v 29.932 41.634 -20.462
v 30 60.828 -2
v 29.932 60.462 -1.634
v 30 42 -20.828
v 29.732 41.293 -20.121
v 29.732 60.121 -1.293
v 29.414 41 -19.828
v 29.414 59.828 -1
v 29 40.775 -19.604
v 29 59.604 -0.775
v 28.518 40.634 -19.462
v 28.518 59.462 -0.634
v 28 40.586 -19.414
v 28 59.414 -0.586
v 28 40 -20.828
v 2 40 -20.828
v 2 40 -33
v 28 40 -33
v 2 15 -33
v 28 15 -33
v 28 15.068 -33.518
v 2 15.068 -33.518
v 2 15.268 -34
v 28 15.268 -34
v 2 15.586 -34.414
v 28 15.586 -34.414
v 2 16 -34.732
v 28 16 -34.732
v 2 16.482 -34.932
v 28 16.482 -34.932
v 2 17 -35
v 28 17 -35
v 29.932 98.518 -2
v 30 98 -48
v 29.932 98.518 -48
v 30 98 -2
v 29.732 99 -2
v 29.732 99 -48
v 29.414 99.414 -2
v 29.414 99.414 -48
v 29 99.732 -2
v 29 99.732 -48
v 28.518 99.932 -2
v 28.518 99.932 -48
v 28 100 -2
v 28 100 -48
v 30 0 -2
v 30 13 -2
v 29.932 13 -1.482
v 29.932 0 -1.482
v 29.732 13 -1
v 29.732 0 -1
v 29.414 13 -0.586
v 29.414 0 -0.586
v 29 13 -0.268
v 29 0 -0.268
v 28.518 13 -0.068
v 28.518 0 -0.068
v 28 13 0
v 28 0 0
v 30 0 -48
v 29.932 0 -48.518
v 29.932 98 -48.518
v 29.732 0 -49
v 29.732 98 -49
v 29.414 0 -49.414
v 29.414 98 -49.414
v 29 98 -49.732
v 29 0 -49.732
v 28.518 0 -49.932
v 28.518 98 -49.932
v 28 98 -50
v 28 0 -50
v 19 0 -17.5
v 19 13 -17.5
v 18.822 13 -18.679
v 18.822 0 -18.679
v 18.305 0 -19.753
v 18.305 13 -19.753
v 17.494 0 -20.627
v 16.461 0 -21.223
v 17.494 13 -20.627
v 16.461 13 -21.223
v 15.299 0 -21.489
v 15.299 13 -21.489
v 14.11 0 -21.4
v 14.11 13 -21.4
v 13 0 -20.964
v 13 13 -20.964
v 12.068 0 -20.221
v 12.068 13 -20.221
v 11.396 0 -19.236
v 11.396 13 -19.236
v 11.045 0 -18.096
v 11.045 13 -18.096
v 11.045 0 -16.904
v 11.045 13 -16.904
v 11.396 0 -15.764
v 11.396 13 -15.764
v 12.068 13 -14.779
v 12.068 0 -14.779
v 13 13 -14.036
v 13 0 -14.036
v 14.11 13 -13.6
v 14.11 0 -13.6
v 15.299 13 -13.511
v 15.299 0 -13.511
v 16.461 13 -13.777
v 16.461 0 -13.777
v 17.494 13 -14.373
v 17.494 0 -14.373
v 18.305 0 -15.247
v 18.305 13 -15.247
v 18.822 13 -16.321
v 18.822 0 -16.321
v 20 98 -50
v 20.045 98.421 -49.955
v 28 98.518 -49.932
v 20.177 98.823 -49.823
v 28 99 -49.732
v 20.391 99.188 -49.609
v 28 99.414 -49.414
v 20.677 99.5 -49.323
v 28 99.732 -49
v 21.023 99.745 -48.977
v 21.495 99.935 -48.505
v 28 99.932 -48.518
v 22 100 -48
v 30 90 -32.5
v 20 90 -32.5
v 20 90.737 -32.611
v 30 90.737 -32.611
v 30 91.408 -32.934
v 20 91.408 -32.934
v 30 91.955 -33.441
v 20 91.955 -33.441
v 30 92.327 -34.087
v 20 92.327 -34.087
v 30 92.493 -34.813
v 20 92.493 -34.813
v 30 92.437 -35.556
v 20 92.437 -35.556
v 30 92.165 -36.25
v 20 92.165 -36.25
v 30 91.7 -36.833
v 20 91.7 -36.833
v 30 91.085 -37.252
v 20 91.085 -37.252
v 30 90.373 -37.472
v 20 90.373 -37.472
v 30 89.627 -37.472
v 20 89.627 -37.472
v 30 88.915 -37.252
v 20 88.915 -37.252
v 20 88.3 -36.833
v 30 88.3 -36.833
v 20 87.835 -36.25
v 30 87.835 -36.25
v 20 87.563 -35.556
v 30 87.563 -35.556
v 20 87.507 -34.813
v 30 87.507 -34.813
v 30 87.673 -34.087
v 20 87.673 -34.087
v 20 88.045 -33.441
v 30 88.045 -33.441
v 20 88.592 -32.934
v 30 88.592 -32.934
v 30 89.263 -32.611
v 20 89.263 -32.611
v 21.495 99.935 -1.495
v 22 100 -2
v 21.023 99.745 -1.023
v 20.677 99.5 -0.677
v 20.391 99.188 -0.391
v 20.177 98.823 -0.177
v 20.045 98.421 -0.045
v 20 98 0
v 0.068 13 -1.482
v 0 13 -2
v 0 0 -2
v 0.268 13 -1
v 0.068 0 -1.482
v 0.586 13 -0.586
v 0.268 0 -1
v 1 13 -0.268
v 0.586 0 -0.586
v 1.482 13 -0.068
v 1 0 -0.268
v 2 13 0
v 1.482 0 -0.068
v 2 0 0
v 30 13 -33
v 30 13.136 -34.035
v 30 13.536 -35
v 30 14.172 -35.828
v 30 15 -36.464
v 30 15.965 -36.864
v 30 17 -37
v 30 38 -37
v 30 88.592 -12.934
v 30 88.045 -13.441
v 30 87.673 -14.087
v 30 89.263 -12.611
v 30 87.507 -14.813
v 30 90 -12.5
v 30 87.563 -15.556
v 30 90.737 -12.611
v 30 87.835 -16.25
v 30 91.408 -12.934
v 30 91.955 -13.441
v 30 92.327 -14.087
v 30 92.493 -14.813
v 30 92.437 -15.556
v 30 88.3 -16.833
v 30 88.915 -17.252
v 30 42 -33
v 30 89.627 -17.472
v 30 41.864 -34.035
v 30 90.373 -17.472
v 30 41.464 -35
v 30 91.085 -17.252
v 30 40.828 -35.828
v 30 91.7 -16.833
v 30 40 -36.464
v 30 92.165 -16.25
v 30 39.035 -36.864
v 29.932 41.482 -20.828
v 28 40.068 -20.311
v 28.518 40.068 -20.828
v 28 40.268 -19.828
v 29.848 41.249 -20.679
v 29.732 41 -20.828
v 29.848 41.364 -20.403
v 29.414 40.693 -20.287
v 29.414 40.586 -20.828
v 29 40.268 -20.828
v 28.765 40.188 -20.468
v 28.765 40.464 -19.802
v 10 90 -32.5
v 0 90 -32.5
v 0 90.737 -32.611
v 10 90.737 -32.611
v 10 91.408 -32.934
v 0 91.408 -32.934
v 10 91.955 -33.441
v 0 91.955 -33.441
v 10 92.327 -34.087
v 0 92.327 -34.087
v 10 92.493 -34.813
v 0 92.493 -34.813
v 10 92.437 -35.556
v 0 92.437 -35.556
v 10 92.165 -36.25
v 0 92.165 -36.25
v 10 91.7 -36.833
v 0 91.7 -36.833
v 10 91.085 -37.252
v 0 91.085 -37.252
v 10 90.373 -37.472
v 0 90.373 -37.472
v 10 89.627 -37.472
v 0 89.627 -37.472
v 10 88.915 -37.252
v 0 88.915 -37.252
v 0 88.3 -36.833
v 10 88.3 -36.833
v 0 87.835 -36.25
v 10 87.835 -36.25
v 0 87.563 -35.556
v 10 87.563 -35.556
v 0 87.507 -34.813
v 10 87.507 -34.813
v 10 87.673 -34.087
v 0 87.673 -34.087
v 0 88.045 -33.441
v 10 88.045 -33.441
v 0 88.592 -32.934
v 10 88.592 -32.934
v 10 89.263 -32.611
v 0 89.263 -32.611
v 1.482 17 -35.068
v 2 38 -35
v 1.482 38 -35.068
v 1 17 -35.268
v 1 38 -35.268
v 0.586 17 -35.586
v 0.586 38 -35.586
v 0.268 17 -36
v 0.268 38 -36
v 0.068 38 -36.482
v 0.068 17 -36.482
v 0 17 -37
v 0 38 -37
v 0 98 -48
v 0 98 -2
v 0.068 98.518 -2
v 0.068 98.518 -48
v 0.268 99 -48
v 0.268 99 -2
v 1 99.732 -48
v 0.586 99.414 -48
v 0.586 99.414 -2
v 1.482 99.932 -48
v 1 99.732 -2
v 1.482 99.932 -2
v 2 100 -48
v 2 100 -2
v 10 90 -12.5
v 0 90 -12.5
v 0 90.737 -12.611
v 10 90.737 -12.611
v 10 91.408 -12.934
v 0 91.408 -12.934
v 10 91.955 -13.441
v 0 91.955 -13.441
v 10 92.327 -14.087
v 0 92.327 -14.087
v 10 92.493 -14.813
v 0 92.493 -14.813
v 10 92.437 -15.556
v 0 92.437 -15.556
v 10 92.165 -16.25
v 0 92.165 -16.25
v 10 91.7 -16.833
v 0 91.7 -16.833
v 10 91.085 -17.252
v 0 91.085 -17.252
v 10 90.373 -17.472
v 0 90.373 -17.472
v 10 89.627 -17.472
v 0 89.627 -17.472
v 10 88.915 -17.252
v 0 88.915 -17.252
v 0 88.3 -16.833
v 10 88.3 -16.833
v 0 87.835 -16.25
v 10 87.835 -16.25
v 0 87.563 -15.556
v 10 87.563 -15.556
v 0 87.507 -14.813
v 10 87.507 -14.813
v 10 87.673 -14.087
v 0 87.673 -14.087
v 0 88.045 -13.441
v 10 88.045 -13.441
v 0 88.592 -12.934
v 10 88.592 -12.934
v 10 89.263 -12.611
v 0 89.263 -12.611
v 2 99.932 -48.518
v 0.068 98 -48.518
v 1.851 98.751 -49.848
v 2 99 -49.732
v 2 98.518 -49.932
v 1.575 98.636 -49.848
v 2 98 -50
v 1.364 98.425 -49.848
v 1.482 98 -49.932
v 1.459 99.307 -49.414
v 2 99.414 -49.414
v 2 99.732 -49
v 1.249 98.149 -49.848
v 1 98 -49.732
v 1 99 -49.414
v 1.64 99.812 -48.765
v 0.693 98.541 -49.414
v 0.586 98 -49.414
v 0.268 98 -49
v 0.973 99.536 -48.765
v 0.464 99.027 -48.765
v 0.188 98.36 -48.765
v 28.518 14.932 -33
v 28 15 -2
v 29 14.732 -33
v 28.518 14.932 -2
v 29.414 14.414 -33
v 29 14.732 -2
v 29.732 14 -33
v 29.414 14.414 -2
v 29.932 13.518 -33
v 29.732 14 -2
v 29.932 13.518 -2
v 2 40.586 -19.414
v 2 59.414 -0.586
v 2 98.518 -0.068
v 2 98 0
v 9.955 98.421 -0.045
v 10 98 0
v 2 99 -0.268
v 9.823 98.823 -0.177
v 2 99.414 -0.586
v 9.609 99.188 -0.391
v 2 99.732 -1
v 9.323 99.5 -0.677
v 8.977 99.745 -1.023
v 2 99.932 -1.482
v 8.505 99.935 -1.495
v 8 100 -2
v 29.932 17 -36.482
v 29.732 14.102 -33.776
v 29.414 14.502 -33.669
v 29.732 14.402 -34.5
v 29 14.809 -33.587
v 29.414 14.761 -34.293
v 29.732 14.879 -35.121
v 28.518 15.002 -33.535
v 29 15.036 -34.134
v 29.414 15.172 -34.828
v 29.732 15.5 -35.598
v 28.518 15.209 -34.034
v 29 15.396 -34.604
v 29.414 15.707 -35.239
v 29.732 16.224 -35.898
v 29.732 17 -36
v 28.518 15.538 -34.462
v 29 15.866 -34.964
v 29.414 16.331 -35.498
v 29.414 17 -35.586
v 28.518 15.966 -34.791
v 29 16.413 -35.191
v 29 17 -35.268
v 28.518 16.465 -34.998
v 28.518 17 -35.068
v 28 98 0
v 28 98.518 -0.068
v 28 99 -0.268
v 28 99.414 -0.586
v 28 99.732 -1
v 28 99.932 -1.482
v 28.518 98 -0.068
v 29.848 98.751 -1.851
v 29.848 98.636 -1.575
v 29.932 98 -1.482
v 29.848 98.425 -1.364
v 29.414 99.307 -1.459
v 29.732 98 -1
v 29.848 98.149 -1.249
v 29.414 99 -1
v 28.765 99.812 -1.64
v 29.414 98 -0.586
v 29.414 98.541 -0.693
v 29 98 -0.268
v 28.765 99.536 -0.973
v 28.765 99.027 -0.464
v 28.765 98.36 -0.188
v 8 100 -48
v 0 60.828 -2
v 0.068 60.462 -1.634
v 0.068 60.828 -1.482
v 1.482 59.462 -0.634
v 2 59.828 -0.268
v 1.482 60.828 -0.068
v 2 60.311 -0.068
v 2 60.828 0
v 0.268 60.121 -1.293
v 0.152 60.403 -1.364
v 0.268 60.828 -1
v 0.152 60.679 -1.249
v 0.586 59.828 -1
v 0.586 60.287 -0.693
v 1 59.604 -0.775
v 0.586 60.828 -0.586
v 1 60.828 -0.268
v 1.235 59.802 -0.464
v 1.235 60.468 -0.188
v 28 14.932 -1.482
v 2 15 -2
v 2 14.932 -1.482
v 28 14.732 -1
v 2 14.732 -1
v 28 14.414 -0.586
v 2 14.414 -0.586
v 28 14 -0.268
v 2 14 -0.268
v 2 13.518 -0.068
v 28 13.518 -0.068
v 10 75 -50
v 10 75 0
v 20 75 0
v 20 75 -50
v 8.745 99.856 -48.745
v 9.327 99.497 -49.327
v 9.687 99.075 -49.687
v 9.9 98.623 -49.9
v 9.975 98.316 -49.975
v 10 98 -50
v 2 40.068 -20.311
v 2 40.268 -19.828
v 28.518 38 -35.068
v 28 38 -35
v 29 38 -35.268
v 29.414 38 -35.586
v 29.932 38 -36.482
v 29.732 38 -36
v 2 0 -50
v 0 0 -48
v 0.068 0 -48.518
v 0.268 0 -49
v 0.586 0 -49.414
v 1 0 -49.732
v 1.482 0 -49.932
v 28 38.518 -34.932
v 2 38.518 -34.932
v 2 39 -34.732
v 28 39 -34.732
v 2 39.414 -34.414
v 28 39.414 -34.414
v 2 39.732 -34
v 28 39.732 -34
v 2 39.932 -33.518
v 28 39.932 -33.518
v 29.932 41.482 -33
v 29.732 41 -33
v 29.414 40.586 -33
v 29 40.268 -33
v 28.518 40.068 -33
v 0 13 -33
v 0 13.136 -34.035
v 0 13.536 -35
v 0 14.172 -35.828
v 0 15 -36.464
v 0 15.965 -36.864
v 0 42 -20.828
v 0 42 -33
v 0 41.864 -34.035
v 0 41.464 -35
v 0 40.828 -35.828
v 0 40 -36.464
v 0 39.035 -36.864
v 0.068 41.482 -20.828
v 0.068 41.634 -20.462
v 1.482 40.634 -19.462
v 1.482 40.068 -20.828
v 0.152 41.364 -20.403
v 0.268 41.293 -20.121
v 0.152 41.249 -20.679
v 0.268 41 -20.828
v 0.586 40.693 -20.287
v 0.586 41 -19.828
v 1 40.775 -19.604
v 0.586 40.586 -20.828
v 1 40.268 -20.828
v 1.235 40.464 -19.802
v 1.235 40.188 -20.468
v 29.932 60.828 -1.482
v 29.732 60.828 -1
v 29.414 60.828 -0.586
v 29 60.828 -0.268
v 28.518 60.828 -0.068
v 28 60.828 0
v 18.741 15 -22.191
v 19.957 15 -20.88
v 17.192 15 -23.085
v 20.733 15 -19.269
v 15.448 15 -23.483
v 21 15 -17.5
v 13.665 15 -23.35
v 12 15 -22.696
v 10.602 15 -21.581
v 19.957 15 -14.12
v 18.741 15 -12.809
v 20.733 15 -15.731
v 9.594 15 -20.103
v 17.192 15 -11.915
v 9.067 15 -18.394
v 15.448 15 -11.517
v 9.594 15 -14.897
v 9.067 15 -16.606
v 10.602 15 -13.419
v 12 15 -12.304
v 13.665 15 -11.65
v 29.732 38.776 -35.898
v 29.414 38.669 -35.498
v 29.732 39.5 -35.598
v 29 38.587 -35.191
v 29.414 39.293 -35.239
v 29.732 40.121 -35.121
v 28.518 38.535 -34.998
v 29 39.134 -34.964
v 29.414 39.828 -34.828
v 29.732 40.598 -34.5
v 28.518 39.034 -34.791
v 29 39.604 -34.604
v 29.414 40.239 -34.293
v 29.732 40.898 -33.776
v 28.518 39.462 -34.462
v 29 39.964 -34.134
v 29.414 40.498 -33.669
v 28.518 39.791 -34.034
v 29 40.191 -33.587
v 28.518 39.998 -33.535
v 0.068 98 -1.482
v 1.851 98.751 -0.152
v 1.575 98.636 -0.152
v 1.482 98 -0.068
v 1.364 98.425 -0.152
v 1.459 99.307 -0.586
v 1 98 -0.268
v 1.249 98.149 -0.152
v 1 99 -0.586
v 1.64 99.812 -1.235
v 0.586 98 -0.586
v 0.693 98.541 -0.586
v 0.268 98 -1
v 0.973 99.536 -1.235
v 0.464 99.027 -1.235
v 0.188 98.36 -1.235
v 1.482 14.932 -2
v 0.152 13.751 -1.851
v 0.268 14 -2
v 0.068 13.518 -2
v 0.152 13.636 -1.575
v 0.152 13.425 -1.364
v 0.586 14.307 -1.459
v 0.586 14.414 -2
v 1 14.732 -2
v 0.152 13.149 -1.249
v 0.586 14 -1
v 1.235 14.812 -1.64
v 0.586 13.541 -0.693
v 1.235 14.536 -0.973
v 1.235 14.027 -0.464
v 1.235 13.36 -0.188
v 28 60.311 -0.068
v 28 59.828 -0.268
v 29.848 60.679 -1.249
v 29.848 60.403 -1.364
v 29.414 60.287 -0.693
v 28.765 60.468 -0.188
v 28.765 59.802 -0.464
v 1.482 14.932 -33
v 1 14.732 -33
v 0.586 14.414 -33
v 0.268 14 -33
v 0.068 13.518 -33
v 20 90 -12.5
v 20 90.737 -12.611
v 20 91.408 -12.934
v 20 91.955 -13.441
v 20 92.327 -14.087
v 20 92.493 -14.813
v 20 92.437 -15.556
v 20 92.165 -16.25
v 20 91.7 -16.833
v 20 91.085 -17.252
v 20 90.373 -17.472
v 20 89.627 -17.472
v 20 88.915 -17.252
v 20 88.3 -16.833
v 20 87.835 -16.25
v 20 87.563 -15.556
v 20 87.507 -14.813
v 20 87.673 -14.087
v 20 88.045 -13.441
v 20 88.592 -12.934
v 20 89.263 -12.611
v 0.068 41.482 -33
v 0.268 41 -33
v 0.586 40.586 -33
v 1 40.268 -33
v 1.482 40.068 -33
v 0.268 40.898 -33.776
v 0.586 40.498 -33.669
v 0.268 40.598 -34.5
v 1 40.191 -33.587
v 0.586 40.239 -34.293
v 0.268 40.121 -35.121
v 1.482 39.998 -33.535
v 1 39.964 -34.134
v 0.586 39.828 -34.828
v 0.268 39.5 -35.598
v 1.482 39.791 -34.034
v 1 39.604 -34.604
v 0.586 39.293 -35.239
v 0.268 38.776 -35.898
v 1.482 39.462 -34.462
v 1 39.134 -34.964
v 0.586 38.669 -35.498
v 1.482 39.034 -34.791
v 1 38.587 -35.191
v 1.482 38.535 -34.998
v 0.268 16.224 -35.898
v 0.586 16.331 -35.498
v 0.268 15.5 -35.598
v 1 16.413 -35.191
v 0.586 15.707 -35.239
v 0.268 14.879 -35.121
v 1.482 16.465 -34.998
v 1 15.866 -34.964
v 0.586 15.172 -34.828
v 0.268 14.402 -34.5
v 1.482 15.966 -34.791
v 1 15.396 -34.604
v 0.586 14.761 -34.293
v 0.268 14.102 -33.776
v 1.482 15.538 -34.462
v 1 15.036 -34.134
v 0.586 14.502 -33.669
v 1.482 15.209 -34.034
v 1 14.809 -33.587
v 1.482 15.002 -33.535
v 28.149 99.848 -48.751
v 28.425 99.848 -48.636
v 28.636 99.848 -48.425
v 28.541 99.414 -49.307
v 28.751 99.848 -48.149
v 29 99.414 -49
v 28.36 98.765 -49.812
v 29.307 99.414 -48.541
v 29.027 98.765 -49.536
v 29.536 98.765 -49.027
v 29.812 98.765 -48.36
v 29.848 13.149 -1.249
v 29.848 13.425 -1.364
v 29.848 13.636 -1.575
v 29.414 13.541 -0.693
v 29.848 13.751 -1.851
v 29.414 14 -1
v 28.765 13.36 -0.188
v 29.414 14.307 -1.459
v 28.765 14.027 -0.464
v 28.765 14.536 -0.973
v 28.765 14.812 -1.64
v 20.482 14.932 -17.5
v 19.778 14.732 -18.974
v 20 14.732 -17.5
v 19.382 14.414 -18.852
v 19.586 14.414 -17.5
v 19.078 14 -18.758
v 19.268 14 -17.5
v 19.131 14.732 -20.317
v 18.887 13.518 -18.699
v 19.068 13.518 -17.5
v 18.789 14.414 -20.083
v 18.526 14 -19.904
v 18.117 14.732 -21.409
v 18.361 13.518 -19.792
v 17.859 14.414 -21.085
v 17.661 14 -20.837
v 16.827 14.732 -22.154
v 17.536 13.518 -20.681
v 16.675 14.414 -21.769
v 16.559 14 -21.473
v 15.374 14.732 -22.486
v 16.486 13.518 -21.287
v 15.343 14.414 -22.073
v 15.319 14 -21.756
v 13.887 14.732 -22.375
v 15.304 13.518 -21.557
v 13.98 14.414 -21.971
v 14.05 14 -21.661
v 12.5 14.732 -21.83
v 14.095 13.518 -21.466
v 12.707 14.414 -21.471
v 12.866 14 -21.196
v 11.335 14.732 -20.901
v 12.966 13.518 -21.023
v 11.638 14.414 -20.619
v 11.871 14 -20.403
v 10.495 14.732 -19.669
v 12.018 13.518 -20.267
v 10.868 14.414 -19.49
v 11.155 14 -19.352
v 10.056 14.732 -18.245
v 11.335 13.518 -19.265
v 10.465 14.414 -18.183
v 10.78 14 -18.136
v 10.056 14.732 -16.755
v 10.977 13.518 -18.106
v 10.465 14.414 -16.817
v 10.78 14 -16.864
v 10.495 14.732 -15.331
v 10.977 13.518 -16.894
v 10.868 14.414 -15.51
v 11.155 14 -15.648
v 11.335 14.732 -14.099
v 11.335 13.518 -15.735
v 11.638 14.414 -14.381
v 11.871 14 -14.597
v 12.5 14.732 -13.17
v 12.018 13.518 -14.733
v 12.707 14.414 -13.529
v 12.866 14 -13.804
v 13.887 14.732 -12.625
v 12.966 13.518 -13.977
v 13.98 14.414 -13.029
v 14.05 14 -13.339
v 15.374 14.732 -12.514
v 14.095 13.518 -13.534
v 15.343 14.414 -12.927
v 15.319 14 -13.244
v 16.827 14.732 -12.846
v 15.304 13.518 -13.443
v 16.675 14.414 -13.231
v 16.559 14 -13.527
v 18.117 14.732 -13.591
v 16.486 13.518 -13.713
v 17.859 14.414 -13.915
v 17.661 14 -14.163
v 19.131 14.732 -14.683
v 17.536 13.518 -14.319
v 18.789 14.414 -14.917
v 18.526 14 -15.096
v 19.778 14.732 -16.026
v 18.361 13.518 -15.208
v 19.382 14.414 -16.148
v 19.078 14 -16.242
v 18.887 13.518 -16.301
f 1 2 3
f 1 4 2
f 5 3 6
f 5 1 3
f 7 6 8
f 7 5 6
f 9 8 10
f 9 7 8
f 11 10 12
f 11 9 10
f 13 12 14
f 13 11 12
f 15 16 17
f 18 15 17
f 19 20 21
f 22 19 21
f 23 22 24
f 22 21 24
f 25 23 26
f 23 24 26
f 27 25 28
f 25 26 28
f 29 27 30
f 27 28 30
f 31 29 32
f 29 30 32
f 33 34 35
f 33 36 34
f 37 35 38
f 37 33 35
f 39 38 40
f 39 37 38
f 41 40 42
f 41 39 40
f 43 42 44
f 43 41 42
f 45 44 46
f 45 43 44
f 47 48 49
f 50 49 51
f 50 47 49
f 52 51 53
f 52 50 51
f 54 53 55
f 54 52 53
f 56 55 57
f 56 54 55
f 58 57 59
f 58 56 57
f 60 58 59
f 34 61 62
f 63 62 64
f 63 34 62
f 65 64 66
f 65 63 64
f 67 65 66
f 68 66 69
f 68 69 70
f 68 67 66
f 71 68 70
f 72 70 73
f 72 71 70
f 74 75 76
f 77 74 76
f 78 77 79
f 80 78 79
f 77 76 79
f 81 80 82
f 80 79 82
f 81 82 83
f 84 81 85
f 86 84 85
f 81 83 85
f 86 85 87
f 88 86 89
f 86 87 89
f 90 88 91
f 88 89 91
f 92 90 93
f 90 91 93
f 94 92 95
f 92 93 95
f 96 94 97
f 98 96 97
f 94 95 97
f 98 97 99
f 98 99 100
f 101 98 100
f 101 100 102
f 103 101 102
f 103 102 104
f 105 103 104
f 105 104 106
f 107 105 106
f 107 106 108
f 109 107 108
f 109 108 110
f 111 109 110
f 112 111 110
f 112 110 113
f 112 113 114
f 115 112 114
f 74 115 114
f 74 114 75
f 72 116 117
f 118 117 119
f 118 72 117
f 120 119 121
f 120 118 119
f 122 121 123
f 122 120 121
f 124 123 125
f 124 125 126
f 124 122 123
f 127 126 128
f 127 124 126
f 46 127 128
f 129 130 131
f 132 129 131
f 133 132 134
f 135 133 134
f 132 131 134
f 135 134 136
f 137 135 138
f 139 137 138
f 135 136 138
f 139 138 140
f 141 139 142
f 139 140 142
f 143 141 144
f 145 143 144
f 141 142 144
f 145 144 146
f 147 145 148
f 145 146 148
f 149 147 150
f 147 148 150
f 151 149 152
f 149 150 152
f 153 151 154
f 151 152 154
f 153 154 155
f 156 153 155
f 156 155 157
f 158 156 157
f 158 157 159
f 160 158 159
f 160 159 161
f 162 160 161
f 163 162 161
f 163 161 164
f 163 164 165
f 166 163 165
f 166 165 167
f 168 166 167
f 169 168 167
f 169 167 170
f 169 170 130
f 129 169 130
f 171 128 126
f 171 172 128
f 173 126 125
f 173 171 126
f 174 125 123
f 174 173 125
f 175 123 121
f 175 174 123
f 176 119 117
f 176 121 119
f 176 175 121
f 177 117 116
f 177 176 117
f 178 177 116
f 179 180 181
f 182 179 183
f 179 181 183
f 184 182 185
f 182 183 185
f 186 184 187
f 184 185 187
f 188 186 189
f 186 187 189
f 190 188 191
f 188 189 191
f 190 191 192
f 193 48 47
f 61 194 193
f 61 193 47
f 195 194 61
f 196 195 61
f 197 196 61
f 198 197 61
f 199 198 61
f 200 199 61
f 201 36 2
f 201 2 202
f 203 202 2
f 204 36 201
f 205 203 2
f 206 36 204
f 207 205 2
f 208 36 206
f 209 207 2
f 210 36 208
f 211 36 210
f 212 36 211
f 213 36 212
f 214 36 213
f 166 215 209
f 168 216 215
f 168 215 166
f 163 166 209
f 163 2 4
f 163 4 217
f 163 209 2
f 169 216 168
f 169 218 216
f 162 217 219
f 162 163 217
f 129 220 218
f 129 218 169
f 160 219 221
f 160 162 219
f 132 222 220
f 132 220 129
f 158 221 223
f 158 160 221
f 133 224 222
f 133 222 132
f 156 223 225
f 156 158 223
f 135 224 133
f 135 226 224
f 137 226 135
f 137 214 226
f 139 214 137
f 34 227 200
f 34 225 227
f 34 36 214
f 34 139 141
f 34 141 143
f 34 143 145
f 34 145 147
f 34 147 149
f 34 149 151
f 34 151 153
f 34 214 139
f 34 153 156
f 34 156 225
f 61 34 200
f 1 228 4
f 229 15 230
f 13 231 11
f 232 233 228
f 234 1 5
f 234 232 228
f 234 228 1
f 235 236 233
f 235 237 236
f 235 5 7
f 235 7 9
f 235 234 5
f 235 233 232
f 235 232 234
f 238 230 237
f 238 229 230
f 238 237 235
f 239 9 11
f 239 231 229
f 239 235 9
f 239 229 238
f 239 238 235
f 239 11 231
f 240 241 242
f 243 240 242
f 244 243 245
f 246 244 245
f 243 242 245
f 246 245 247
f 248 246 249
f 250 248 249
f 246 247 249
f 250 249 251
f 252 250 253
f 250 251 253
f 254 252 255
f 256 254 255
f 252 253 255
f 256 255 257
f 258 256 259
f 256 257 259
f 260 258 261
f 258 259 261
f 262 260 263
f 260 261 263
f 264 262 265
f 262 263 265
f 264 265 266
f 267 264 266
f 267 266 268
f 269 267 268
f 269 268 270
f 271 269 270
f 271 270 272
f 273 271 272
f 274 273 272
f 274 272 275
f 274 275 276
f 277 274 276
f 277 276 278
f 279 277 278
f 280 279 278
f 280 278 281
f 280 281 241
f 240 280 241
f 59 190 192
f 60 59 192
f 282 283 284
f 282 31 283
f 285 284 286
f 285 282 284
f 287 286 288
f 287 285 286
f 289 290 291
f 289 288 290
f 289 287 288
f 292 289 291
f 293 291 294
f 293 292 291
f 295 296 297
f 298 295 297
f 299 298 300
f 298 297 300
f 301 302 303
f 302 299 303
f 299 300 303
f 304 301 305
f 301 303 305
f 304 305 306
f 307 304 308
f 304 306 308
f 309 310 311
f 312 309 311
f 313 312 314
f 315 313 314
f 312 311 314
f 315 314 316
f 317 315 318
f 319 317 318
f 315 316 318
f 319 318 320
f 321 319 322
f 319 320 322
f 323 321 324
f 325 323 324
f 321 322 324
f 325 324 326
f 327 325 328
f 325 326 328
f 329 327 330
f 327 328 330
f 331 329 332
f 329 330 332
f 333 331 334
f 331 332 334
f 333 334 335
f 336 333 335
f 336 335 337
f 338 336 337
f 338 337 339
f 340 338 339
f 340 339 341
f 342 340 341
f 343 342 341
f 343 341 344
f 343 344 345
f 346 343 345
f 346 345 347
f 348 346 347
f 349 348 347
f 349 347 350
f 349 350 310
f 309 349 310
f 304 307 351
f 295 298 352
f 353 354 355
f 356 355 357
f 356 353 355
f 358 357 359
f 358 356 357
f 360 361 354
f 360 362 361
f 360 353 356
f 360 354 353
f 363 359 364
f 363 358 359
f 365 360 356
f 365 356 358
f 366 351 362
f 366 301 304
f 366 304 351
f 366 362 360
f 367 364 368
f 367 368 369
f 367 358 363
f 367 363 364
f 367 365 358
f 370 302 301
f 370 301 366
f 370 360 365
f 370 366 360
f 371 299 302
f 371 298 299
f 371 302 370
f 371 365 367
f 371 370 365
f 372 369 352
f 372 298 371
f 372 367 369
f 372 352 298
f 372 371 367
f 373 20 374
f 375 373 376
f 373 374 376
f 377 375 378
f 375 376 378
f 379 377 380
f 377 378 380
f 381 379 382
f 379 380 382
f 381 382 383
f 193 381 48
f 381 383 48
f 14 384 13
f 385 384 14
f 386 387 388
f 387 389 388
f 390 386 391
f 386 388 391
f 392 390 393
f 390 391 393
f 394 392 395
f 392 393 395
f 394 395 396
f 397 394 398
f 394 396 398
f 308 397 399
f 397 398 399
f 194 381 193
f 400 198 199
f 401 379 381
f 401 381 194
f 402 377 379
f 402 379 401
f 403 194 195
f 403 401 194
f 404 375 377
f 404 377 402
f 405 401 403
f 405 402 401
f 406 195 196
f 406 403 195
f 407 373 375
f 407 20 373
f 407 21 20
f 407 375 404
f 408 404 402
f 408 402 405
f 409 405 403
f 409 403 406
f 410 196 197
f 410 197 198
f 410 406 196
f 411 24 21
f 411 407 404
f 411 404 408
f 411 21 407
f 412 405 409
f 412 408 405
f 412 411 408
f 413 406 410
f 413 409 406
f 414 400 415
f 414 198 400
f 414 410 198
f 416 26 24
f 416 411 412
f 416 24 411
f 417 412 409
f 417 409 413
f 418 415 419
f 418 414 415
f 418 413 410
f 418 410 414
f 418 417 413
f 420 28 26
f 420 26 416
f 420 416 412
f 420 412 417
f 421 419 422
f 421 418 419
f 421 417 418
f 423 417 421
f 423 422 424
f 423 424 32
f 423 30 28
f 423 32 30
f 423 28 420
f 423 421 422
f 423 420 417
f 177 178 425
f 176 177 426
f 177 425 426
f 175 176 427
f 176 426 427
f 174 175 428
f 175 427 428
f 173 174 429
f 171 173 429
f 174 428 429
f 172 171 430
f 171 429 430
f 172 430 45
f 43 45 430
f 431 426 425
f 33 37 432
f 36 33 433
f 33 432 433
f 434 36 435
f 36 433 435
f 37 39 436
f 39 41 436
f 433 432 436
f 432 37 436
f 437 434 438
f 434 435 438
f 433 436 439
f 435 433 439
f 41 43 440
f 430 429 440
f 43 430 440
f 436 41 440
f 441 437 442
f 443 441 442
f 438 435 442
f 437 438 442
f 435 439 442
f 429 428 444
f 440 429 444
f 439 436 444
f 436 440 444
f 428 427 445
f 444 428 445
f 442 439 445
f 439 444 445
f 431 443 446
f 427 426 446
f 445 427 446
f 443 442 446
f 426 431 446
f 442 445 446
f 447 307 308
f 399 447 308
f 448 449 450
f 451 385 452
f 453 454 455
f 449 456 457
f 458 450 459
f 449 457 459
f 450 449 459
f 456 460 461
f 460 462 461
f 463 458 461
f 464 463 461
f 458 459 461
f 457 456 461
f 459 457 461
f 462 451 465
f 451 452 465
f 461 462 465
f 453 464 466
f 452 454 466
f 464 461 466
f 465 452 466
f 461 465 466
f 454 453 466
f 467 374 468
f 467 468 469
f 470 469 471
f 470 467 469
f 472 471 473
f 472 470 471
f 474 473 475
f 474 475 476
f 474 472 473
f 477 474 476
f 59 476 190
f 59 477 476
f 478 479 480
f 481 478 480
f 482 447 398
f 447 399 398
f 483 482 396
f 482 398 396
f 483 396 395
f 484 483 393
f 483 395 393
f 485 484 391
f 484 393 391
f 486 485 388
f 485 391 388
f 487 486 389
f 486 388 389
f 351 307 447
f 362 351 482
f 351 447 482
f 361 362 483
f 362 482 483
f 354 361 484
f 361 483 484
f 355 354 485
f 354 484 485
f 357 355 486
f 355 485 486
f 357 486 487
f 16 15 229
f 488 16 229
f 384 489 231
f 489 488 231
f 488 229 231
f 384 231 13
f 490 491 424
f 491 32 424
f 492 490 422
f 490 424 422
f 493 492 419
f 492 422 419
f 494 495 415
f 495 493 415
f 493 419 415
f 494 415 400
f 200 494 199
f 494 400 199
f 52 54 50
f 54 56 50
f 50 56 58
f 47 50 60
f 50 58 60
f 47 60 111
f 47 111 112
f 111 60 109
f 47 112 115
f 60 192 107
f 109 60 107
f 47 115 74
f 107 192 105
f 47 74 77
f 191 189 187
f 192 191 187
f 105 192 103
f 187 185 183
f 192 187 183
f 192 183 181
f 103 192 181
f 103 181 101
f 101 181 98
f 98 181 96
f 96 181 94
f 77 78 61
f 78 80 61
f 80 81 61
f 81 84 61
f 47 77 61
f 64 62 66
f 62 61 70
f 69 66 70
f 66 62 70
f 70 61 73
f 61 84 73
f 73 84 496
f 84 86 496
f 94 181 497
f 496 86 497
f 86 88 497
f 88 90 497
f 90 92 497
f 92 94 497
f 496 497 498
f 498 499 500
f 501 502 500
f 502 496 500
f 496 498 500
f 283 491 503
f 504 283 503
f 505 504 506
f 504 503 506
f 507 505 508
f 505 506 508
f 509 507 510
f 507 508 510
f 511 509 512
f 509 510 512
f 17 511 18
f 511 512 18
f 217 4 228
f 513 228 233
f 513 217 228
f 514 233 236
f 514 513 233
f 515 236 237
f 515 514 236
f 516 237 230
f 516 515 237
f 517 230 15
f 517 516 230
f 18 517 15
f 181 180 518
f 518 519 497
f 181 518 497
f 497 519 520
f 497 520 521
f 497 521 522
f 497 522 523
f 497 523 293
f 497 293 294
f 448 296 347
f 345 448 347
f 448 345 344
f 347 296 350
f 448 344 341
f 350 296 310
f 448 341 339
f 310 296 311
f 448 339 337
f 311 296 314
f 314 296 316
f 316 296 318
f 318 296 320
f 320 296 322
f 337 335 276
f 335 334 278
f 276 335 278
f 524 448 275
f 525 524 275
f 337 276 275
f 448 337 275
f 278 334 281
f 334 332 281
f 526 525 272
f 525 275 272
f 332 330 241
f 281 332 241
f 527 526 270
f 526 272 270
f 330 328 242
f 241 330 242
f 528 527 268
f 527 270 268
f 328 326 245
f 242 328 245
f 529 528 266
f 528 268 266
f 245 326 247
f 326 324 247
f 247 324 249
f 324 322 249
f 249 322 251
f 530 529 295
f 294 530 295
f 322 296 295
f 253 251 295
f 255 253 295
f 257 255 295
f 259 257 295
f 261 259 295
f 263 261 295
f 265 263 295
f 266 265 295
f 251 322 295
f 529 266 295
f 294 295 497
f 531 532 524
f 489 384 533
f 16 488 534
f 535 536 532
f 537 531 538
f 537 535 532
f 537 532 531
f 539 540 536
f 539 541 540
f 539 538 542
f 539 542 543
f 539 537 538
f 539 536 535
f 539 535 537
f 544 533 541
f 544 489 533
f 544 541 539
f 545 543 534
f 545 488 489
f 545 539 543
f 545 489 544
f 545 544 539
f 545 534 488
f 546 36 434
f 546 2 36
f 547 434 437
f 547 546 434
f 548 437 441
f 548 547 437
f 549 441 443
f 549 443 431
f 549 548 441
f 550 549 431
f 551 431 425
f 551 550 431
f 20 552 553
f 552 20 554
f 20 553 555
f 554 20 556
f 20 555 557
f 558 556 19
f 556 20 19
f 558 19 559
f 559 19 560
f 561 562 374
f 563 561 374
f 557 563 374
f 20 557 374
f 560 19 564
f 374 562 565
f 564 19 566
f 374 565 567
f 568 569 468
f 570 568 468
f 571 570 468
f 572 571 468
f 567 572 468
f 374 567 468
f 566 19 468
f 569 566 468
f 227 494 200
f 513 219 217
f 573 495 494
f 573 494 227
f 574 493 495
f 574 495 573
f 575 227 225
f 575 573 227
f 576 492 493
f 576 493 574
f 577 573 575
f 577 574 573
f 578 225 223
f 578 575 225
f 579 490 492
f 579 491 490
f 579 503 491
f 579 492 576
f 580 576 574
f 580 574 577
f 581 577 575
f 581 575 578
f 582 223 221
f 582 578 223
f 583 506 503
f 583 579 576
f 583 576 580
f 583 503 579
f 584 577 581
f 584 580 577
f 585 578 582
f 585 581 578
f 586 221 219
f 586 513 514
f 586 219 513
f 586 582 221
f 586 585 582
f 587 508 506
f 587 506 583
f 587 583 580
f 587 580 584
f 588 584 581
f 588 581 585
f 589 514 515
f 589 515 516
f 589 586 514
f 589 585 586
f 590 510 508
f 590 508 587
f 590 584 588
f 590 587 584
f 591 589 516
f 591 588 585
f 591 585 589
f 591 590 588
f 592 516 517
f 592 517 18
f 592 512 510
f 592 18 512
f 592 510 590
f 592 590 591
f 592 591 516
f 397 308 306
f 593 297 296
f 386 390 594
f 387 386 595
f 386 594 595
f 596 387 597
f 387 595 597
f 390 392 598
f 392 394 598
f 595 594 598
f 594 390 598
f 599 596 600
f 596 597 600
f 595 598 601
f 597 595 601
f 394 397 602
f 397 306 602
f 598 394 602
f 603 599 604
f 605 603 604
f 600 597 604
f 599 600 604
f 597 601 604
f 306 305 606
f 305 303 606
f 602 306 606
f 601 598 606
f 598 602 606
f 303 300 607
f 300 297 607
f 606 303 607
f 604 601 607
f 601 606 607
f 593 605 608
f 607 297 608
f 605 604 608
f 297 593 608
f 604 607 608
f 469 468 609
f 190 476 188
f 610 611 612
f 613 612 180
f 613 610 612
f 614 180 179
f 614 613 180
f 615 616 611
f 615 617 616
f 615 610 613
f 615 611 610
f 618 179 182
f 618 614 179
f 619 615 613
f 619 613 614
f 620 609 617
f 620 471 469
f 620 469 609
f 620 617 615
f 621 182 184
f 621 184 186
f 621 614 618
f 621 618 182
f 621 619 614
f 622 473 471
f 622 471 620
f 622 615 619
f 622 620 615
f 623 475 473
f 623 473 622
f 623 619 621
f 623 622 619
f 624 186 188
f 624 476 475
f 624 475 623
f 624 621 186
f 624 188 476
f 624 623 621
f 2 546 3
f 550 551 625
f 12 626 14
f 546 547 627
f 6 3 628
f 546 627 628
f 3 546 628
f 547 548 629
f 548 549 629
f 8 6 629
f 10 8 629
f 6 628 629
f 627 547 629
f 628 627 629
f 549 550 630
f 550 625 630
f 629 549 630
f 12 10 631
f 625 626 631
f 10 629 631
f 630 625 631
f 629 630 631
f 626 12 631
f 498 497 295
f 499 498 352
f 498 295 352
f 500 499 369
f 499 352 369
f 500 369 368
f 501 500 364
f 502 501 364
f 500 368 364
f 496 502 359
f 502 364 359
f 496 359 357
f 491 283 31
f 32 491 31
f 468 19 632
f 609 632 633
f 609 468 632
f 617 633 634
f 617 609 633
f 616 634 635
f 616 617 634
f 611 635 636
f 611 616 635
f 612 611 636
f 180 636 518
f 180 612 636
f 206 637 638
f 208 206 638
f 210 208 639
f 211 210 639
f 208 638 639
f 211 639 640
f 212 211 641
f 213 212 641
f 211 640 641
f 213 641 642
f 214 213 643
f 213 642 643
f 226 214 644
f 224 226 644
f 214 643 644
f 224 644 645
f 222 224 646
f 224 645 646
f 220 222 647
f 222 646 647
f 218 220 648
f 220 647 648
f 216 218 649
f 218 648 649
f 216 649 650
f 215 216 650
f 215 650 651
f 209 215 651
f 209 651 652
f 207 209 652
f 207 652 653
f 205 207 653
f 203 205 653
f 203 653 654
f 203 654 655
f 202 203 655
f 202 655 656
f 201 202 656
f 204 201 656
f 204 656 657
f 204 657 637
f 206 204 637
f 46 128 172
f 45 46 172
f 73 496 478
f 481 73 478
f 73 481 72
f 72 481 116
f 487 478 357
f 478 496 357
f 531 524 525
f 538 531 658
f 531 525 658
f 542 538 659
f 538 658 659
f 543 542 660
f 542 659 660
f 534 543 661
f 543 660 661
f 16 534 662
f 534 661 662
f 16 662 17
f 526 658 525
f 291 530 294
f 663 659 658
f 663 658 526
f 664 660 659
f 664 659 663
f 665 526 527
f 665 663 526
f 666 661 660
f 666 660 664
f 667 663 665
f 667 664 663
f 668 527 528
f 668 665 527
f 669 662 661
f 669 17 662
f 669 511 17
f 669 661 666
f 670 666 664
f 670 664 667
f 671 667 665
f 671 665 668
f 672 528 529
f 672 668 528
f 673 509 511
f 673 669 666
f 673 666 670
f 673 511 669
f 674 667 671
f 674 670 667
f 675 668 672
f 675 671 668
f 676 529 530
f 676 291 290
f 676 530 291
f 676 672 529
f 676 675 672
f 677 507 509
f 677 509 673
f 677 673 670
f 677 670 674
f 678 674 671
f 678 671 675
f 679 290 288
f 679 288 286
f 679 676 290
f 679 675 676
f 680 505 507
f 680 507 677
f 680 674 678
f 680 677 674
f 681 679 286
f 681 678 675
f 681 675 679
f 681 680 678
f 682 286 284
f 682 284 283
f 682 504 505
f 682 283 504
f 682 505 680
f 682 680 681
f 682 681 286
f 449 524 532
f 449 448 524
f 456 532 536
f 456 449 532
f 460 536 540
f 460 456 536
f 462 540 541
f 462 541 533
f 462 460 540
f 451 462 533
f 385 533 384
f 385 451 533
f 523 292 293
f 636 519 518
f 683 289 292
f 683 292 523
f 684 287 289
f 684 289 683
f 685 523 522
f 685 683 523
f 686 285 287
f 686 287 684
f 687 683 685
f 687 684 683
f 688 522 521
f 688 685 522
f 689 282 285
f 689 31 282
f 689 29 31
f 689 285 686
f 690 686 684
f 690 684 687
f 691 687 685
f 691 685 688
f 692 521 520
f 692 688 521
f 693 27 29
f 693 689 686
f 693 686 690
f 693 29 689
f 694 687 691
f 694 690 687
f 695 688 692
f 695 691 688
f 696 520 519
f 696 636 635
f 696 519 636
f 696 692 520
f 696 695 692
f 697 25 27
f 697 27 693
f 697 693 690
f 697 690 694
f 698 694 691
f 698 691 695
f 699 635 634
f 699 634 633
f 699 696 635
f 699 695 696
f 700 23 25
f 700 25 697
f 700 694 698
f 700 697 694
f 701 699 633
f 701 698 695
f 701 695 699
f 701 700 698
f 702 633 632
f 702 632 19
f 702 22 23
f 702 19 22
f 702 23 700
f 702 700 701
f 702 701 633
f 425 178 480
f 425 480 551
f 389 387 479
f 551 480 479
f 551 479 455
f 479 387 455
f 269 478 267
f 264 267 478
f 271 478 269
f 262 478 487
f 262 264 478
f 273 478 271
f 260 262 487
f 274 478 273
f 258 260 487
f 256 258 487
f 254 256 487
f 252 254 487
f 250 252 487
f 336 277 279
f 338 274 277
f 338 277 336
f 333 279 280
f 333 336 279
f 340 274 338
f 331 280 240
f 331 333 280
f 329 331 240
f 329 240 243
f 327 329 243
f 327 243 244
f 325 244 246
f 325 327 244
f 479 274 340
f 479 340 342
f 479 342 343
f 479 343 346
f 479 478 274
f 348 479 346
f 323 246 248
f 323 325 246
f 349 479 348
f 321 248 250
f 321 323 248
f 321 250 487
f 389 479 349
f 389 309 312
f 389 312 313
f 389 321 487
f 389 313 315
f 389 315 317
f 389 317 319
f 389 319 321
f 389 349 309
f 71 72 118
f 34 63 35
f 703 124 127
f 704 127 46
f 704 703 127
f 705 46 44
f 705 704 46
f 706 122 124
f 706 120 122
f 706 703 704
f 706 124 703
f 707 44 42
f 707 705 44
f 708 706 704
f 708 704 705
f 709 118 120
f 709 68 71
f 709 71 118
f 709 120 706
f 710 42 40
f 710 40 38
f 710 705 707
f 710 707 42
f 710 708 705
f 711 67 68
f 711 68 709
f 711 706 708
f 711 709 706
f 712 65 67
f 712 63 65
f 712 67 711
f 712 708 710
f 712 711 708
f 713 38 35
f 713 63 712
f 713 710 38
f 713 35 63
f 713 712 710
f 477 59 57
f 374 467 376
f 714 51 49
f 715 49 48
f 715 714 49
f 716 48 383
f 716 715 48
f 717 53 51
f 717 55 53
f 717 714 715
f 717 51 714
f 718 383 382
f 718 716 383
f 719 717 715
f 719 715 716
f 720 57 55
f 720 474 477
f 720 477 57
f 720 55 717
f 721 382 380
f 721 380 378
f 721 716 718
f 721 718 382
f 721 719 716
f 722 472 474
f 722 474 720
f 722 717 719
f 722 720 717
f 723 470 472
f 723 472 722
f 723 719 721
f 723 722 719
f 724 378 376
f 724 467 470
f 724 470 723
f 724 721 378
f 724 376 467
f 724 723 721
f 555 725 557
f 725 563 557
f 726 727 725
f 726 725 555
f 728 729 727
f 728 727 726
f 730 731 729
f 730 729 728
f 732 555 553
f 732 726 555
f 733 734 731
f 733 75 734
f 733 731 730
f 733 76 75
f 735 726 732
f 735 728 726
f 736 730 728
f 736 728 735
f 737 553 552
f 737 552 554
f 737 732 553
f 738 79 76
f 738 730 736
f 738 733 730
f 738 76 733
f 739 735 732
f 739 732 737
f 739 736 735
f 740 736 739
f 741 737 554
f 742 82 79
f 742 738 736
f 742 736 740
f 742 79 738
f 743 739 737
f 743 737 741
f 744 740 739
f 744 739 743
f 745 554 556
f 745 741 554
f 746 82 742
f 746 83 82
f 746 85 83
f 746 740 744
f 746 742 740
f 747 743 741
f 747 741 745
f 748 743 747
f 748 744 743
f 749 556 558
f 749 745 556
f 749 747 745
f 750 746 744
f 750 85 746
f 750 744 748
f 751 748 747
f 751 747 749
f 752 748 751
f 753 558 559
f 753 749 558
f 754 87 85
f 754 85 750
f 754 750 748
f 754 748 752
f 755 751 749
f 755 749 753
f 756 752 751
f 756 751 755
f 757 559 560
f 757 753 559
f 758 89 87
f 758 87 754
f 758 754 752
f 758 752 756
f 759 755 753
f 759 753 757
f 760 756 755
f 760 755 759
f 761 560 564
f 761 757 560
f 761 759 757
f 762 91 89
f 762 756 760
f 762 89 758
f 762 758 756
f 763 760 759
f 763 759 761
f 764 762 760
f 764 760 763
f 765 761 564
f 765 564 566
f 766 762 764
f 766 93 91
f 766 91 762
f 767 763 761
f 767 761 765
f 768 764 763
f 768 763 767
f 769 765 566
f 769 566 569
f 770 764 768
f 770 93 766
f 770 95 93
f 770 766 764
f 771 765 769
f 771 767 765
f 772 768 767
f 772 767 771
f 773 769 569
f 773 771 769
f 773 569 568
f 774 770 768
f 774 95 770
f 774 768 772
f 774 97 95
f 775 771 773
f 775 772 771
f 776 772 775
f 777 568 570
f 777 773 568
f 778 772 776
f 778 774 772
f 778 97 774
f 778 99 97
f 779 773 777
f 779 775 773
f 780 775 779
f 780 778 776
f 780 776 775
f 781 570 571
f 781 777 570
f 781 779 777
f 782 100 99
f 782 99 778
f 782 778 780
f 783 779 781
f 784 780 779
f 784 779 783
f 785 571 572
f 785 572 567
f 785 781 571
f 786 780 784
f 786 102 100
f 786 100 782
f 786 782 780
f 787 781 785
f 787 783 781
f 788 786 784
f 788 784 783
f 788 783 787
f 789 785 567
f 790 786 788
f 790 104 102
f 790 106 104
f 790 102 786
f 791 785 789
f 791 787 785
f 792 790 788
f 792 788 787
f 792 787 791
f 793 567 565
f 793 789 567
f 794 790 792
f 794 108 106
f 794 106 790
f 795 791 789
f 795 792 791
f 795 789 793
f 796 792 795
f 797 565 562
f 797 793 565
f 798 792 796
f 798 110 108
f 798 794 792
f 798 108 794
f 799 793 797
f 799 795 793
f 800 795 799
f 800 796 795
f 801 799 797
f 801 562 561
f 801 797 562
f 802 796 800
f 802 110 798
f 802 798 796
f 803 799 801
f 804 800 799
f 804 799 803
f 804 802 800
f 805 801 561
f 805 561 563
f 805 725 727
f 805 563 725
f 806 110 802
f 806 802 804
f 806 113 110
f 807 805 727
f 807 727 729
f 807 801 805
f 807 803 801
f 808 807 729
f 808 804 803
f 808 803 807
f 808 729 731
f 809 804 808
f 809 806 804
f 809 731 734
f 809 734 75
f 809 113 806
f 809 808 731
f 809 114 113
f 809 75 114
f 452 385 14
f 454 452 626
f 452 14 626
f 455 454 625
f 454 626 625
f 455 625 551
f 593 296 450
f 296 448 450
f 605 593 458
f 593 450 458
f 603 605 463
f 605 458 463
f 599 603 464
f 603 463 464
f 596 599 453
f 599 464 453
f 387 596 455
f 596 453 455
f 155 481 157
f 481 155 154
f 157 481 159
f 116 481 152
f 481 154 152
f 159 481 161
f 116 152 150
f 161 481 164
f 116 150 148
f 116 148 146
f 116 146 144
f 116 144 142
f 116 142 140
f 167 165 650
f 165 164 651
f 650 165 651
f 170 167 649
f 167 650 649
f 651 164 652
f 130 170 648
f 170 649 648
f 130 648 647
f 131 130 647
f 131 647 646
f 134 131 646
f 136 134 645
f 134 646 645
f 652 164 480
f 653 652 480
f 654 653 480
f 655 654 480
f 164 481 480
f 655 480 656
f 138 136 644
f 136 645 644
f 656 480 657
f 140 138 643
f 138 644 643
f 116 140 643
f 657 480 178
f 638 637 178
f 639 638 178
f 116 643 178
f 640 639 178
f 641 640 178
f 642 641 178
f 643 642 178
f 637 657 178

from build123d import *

# Parameters (mm, degrees)
BOSS_EXTRUDE1_DEPTH = 30
SKETCH3_R           = 4
CUT_EXTRUDE1_DEPTH  = 30
SKETCH4_W           = 10
SKETCH4_H           = 50
CUT_EXTRUDE2_DEPTH  = 51
SKETCH5_R           = 2.5
CUT_EXTRUDE3_DEPTH  = 30
FILLET1_R           = 2
CUT_EXTRUDE4_DEPTH  = 31
FILLET2_R           = 2


with BuildPart() as part:
    # Sketch2 → Boss-Extrude1 (new body)
    with BuildSketch(Plane(origin=(0, 0, 0), x_dir=(0, 0, -1), z_dir=(1, 0, 0))):
        Polygon((0, 40), (35, 40), (35, 15), (0, 15), (0, 0), (50, 0), (50, 100), (0, 100), align=None)
    extrude(amount=BOSS_EXTRUDE1_DEPTH)

    # Sketch3 → Cut-Extrude1 (cut)
    with BuildSketch(Plane(origin=(0, 15, 0), x_dir=(1, 0, 0), z_dir=(0, 1, 0))):
        with Locations((15, 17.5)):
            Circle(SKETCH3_R)
    extrude(amount=-CUT_EXTRUDE1_DEPTH, mode=Mode.SUBTRACT)

    # Sketch4 → Cut-Extrude2 (cut, through all)
    with BuildSketch(Plane.XY):
        with Locations((15, 100)):
            Rectangle(SKETCH4_W, SKETCH4_H)
    extrude(amount=-CUT_EXTRUDE2_DEPTH, mode=Mode.SUBTRACT)

    # Sketch5 → Cut-Extrude3 (cut)
    with BuildSketch(Plane.ZY):
        with Locations((-35, 90)):
            Circle(SKETCH5_R)
        with Locations((-15, 90)):
            Circle(SKETCH5_R)
    extrude(amount=-CUT_EXTRUDE3_DEPTH, mode=Mode.SUBTRACT)

    # Fillet1
    fillet1_edges = [part.edges().sort_by_distance(p)[0] for p in [
        (11, 15, -17.5),
    ]]
    fillet(fillet1_edges, radius=FILLET1_R)

    # Sketch6 → Cut-Extrude4 (cut, through all)
    with BuildSketch(Plane.ZY):
        Polygon((-20, 40), (0, 60), (0, 40), align=None)
    extrude(amount=-CUT_EXTRUDE4_DEPTH, mode=Mode.SUBTRACT)

    # Fillet2
    fillet2_edges = [part.edges().sort_by_distance(p)[0] for p in [
        (30, 50, -50),
        (0, 100, -25),
        (15, 40, -35),
        (15, 15, -35),
        (15, 15, 0),
        (25, 100, -50),
        (25, 100, 0),
        (30, 7.5, 0),
        (30, 15, -17.5),
        (30, 27.5, -35),
        (5, 100, 0),
        (5, 100, -50),
        (10, 100, -25),
        (20, 100, -25),
        (30, 100, -25),
        (0, 80, 0),
        (0, 40, -27.5),
        (30, 80, 0),
        (30, 40, -27.5),
        (30, 50, -10),
        (15, 40, -20),
        (15, 60, 0),
        (0, 50, -10),
        (0, 27.5, -35),
        (0, 15, -17.5),
        (0, 7.5, 0),
        (0, 50, -50),
    ]]
    fillet(fillet2_edges, radius=FILLET2_R)


solid = part.part
